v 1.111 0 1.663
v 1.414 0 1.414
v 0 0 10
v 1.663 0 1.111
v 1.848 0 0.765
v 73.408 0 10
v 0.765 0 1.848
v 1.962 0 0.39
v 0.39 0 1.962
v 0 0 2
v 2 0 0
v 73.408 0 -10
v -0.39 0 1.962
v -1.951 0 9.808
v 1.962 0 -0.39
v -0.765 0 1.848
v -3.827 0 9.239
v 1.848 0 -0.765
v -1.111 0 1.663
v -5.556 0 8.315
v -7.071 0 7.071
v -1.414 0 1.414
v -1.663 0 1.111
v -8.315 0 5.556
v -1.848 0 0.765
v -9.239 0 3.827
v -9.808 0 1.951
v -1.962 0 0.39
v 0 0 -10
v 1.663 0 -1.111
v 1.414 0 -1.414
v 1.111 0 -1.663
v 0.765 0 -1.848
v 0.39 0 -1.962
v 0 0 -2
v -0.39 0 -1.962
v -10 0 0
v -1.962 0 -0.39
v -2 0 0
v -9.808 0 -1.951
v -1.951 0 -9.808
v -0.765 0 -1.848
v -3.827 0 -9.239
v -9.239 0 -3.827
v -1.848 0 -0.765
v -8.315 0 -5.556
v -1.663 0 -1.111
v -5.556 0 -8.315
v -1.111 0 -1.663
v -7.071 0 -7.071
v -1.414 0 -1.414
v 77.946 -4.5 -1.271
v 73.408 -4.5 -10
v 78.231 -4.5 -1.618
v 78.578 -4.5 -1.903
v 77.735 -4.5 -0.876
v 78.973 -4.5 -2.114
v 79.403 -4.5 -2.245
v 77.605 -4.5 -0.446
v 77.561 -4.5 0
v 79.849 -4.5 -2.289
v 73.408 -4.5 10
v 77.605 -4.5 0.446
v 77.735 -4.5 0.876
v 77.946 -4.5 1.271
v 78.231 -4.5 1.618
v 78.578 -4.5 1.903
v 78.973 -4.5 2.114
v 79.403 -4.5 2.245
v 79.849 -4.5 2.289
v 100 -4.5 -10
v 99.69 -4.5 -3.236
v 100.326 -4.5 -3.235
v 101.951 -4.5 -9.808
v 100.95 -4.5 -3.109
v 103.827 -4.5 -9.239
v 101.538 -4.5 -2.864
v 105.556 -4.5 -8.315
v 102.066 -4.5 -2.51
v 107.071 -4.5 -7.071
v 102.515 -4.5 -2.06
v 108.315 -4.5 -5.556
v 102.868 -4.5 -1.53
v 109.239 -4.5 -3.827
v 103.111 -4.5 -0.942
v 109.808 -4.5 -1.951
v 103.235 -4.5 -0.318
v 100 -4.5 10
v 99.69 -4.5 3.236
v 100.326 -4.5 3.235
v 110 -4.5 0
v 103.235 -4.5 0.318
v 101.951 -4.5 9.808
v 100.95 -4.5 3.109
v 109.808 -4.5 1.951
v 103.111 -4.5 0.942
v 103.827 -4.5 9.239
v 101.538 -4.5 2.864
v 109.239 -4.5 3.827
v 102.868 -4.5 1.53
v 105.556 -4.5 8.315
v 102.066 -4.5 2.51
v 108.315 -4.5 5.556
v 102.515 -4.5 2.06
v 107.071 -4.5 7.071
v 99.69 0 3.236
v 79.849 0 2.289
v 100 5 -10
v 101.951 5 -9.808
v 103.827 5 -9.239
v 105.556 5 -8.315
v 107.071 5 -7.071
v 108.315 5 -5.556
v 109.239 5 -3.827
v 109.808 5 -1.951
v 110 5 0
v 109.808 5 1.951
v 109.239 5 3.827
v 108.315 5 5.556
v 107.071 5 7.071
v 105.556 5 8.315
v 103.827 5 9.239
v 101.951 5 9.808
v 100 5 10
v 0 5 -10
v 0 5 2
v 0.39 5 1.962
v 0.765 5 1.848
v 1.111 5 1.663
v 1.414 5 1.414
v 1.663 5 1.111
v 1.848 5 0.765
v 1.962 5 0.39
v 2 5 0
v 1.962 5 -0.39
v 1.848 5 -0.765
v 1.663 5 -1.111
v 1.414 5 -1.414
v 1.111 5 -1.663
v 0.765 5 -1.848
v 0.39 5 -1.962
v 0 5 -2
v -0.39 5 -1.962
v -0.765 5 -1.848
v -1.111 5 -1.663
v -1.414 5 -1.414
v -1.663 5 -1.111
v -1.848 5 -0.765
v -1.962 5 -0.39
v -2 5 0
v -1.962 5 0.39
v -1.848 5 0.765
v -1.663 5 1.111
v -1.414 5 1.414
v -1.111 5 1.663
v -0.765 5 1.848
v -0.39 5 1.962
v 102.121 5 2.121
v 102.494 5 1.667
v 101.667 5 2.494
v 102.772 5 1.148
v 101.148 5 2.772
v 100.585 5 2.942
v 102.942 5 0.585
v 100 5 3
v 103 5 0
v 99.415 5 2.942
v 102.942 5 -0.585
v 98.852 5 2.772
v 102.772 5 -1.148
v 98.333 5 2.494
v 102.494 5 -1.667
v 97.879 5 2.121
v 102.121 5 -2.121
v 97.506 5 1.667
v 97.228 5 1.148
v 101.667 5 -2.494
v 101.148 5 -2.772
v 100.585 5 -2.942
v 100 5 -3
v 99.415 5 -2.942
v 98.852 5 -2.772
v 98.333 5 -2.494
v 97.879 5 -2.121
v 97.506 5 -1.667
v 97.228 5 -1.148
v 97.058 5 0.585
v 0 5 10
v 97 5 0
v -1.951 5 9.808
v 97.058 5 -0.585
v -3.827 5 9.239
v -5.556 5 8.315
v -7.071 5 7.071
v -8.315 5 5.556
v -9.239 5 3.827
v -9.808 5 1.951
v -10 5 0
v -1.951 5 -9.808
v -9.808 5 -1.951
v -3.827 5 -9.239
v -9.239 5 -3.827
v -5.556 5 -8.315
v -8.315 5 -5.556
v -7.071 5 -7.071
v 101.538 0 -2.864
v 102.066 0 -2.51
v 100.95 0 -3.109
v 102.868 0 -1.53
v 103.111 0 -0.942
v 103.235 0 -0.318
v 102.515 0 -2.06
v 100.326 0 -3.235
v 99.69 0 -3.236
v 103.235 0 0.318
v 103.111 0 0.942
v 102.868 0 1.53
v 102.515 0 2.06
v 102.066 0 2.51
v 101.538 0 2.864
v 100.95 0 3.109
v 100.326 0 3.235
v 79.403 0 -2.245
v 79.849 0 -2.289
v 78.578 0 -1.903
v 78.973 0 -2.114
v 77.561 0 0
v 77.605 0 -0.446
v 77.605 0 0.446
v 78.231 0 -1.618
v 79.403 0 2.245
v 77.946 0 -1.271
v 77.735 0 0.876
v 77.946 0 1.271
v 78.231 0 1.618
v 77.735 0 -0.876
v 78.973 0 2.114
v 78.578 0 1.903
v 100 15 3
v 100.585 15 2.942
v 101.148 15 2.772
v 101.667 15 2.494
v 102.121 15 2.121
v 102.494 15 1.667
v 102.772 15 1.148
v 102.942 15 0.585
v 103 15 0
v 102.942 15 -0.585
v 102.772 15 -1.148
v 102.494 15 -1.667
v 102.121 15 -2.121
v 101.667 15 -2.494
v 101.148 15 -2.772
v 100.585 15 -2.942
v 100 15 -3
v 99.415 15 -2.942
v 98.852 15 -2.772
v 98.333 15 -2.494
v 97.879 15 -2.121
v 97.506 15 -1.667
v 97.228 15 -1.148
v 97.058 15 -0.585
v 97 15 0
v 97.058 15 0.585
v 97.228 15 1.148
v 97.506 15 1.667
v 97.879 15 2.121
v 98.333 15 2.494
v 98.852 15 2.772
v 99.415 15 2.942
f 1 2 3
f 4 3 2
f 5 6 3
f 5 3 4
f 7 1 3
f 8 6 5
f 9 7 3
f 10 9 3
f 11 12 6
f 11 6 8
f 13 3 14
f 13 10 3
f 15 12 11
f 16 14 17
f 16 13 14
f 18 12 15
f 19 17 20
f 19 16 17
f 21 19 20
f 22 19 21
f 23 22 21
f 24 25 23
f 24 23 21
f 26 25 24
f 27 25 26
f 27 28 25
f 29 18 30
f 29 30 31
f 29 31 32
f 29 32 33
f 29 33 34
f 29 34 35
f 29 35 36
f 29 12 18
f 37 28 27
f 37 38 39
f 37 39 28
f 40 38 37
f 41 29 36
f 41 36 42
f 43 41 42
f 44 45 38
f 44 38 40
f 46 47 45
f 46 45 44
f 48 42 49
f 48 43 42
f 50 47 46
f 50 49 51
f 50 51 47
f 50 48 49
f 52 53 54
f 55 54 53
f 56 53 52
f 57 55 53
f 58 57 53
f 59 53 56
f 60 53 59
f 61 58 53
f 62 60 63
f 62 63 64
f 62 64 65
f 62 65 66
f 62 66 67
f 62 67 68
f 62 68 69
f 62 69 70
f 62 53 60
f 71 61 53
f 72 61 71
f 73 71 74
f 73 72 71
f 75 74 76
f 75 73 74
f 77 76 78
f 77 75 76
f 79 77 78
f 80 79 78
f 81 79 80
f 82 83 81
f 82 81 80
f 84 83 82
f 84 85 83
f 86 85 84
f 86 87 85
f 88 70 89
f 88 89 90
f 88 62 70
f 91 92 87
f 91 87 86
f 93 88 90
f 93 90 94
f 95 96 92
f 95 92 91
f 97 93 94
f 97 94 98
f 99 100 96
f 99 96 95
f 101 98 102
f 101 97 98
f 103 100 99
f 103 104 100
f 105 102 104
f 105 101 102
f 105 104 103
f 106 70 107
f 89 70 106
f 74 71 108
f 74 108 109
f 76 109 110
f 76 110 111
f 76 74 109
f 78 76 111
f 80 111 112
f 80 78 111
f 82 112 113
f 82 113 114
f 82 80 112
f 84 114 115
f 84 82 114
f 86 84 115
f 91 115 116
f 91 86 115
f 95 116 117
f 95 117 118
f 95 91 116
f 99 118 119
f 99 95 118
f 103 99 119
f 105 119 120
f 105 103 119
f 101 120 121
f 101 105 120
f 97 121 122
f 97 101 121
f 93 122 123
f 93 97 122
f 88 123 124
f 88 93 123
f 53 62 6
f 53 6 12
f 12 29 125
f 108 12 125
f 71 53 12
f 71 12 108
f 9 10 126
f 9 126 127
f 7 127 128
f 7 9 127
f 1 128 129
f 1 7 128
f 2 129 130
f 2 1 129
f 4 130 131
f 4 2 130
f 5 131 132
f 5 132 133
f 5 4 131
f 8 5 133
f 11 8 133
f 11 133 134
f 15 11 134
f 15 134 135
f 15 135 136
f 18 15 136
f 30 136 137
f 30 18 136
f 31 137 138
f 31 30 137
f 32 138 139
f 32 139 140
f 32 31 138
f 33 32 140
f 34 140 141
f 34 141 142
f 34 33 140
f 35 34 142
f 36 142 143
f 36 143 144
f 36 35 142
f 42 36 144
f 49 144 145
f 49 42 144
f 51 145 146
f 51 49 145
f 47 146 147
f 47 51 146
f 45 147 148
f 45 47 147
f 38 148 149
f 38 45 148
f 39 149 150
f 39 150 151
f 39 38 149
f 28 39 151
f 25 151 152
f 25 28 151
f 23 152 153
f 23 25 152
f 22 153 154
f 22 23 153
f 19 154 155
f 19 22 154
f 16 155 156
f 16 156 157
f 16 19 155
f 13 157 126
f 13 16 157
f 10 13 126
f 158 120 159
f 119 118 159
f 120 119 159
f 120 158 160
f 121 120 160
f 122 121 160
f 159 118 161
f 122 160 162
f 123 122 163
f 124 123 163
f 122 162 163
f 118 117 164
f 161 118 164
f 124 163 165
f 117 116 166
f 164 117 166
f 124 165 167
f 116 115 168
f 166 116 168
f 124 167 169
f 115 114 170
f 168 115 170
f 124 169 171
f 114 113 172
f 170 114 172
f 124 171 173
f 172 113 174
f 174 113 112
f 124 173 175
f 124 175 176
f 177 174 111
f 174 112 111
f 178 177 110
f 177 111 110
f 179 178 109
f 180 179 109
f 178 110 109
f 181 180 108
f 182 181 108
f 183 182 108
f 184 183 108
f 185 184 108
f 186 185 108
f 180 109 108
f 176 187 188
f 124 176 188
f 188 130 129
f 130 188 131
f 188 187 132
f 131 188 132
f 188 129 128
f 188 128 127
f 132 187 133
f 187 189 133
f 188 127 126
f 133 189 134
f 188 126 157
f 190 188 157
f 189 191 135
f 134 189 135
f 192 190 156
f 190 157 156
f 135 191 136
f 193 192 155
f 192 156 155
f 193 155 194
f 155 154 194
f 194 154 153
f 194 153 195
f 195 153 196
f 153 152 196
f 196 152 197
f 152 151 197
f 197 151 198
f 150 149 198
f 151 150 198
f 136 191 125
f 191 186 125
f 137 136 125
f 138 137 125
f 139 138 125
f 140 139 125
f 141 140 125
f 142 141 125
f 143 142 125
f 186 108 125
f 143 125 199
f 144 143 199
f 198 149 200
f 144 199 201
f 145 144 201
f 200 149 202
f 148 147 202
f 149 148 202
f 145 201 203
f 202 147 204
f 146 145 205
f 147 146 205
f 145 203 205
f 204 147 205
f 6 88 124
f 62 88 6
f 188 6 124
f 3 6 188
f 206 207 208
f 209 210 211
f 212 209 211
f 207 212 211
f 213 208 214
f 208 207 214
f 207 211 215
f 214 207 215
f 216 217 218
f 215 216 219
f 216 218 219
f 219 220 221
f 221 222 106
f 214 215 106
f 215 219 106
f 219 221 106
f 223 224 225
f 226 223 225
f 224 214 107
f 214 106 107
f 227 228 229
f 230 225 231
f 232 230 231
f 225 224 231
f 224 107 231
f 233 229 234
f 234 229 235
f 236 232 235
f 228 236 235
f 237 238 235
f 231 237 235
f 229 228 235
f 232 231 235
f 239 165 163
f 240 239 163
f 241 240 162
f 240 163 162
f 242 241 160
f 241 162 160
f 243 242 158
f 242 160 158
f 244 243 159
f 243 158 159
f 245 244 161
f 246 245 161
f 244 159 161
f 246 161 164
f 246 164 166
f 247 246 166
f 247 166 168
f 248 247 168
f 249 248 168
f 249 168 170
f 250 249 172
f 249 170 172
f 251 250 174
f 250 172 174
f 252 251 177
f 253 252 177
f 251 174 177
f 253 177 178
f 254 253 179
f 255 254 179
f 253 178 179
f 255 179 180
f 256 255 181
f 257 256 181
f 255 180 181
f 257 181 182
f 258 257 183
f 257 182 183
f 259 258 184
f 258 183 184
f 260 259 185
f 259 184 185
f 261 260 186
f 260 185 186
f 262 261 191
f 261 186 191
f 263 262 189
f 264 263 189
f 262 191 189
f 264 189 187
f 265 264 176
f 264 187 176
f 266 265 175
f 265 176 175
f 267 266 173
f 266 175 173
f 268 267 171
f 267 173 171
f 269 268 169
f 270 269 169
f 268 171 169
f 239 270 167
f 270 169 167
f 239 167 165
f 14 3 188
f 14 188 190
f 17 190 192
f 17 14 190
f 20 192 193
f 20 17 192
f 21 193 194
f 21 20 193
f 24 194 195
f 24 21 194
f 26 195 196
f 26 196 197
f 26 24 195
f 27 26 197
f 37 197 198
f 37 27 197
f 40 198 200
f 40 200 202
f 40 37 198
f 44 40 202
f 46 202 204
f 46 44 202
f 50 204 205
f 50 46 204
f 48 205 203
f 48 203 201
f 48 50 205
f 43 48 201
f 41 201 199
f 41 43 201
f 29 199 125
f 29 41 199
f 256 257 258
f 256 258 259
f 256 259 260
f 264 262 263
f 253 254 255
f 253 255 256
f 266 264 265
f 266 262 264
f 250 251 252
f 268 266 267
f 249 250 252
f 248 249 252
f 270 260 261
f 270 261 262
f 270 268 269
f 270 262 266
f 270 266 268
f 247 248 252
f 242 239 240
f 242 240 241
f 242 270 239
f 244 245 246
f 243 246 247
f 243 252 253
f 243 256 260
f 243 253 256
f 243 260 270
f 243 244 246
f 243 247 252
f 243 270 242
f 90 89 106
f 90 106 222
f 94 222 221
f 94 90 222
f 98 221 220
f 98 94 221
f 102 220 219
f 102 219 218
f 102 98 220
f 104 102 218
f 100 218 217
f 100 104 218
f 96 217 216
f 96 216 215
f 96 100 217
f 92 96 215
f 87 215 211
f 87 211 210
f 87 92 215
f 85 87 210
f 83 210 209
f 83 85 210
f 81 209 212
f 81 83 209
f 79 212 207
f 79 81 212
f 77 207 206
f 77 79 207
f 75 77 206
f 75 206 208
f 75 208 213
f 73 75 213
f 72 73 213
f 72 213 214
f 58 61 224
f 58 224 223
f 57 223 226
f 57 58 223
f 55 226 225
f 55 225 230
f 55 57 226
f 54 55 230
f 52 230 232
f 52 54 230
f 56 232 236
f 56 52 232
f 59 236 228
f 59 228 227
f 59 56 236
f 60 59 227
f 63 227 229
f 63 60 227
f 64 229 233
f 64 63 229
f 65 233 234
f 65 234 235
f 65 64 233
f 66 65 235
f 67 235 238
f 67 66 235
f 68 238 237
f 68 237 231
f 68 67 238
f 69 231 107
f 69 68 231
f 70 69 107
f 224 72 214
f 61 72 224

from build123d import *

# Parameters (mm, degrees)
SKETCH_1_R          = 2
EXTRUDE_1_DEPTH     = 5
SKETCH_2_R          = 3
EXTRUDE_2_DEPTH     = 10
EXTRUDE_START       = 4.5
EXTRUDE_3_DEPTH     = 4.5
CUT_EXTRUDE_1_DEPTH = 4.5


with BuildPart() as part:
    # 草图1 → 凸台-拉伸1 (new body)
    with BuildSketch(Plane(origin=(0, 0, 0), x_dir=(1, 0, 0), z_dir=(0, 1, 0))):
        with BuildLine():
            Line((0, 10), (100, 10))
            ThreePointArc((100, 10), (110, 0), (100, -10))
            Line((100, -10), (0, -10))
            ThreePointArc((0, -10), (-10, 0), (0, 10))
        make_face()
        with Locations(Location((0, 0, 0), (0, 0, 270))):
            Circle(SKETCH_1_R, mode=Mode.SUBTRACT)
    extrude(amount=EXTRUDE_1_DEPTH)

    # 草图2 → 凸台-拉伸2 (add)
    with BuildSketch(Plane(origin=(0, 5, 0), x_dir=(1, 0, 0), z_dir=(0, 1, 0))):
        with Locations(Location((100, 0, 0), (0, 0, 270))):
            Circle(SKETCH_2_R)
    extrude(amount=EXTRUDE_2_DEPTH)

    # 草图3 → 凸台-拉伸3 (add)
    with BuildSketch(Plane.XZ.offset(EXTRUDE_START)):
        with BuildLine():
            Line((100, 10), (73.40776322, 10))
            Line((73.40776322, 10), (73.40776322, -10))
            Line((73.40776322, -10), (100, -10))
            ThreePointArc((100, -10), (110, 0), (100, 10))
        make_face()
    extrude(amount=-EXTRUDE_3_DEPTH)

    # 草图4 → 切除-拉伸1 (cut)
    with BuildSketch(Plane.XZ.offset(4.5)):
        with BuildLine():
            Line((79.849230428, 2.288593229), (99.690178504, 3.236180981))
            ThreePointArc((99.690178504, 3.236180981), (103.250977807, 0), (99.690178504, -3.236180981))
            Line((99.690178504, -3.236180981), (79.849230428, -2.288593229))
            ThreePointArc((79.849230428, -2.288593229), (77.560637199, 0), (79.849230428, 2.288593229))
        make_face()
    extrude(amount=-CUT_EXTRUDE_1_DEPTH, mode=Mode.SUBTRACT)


solid = part.part
